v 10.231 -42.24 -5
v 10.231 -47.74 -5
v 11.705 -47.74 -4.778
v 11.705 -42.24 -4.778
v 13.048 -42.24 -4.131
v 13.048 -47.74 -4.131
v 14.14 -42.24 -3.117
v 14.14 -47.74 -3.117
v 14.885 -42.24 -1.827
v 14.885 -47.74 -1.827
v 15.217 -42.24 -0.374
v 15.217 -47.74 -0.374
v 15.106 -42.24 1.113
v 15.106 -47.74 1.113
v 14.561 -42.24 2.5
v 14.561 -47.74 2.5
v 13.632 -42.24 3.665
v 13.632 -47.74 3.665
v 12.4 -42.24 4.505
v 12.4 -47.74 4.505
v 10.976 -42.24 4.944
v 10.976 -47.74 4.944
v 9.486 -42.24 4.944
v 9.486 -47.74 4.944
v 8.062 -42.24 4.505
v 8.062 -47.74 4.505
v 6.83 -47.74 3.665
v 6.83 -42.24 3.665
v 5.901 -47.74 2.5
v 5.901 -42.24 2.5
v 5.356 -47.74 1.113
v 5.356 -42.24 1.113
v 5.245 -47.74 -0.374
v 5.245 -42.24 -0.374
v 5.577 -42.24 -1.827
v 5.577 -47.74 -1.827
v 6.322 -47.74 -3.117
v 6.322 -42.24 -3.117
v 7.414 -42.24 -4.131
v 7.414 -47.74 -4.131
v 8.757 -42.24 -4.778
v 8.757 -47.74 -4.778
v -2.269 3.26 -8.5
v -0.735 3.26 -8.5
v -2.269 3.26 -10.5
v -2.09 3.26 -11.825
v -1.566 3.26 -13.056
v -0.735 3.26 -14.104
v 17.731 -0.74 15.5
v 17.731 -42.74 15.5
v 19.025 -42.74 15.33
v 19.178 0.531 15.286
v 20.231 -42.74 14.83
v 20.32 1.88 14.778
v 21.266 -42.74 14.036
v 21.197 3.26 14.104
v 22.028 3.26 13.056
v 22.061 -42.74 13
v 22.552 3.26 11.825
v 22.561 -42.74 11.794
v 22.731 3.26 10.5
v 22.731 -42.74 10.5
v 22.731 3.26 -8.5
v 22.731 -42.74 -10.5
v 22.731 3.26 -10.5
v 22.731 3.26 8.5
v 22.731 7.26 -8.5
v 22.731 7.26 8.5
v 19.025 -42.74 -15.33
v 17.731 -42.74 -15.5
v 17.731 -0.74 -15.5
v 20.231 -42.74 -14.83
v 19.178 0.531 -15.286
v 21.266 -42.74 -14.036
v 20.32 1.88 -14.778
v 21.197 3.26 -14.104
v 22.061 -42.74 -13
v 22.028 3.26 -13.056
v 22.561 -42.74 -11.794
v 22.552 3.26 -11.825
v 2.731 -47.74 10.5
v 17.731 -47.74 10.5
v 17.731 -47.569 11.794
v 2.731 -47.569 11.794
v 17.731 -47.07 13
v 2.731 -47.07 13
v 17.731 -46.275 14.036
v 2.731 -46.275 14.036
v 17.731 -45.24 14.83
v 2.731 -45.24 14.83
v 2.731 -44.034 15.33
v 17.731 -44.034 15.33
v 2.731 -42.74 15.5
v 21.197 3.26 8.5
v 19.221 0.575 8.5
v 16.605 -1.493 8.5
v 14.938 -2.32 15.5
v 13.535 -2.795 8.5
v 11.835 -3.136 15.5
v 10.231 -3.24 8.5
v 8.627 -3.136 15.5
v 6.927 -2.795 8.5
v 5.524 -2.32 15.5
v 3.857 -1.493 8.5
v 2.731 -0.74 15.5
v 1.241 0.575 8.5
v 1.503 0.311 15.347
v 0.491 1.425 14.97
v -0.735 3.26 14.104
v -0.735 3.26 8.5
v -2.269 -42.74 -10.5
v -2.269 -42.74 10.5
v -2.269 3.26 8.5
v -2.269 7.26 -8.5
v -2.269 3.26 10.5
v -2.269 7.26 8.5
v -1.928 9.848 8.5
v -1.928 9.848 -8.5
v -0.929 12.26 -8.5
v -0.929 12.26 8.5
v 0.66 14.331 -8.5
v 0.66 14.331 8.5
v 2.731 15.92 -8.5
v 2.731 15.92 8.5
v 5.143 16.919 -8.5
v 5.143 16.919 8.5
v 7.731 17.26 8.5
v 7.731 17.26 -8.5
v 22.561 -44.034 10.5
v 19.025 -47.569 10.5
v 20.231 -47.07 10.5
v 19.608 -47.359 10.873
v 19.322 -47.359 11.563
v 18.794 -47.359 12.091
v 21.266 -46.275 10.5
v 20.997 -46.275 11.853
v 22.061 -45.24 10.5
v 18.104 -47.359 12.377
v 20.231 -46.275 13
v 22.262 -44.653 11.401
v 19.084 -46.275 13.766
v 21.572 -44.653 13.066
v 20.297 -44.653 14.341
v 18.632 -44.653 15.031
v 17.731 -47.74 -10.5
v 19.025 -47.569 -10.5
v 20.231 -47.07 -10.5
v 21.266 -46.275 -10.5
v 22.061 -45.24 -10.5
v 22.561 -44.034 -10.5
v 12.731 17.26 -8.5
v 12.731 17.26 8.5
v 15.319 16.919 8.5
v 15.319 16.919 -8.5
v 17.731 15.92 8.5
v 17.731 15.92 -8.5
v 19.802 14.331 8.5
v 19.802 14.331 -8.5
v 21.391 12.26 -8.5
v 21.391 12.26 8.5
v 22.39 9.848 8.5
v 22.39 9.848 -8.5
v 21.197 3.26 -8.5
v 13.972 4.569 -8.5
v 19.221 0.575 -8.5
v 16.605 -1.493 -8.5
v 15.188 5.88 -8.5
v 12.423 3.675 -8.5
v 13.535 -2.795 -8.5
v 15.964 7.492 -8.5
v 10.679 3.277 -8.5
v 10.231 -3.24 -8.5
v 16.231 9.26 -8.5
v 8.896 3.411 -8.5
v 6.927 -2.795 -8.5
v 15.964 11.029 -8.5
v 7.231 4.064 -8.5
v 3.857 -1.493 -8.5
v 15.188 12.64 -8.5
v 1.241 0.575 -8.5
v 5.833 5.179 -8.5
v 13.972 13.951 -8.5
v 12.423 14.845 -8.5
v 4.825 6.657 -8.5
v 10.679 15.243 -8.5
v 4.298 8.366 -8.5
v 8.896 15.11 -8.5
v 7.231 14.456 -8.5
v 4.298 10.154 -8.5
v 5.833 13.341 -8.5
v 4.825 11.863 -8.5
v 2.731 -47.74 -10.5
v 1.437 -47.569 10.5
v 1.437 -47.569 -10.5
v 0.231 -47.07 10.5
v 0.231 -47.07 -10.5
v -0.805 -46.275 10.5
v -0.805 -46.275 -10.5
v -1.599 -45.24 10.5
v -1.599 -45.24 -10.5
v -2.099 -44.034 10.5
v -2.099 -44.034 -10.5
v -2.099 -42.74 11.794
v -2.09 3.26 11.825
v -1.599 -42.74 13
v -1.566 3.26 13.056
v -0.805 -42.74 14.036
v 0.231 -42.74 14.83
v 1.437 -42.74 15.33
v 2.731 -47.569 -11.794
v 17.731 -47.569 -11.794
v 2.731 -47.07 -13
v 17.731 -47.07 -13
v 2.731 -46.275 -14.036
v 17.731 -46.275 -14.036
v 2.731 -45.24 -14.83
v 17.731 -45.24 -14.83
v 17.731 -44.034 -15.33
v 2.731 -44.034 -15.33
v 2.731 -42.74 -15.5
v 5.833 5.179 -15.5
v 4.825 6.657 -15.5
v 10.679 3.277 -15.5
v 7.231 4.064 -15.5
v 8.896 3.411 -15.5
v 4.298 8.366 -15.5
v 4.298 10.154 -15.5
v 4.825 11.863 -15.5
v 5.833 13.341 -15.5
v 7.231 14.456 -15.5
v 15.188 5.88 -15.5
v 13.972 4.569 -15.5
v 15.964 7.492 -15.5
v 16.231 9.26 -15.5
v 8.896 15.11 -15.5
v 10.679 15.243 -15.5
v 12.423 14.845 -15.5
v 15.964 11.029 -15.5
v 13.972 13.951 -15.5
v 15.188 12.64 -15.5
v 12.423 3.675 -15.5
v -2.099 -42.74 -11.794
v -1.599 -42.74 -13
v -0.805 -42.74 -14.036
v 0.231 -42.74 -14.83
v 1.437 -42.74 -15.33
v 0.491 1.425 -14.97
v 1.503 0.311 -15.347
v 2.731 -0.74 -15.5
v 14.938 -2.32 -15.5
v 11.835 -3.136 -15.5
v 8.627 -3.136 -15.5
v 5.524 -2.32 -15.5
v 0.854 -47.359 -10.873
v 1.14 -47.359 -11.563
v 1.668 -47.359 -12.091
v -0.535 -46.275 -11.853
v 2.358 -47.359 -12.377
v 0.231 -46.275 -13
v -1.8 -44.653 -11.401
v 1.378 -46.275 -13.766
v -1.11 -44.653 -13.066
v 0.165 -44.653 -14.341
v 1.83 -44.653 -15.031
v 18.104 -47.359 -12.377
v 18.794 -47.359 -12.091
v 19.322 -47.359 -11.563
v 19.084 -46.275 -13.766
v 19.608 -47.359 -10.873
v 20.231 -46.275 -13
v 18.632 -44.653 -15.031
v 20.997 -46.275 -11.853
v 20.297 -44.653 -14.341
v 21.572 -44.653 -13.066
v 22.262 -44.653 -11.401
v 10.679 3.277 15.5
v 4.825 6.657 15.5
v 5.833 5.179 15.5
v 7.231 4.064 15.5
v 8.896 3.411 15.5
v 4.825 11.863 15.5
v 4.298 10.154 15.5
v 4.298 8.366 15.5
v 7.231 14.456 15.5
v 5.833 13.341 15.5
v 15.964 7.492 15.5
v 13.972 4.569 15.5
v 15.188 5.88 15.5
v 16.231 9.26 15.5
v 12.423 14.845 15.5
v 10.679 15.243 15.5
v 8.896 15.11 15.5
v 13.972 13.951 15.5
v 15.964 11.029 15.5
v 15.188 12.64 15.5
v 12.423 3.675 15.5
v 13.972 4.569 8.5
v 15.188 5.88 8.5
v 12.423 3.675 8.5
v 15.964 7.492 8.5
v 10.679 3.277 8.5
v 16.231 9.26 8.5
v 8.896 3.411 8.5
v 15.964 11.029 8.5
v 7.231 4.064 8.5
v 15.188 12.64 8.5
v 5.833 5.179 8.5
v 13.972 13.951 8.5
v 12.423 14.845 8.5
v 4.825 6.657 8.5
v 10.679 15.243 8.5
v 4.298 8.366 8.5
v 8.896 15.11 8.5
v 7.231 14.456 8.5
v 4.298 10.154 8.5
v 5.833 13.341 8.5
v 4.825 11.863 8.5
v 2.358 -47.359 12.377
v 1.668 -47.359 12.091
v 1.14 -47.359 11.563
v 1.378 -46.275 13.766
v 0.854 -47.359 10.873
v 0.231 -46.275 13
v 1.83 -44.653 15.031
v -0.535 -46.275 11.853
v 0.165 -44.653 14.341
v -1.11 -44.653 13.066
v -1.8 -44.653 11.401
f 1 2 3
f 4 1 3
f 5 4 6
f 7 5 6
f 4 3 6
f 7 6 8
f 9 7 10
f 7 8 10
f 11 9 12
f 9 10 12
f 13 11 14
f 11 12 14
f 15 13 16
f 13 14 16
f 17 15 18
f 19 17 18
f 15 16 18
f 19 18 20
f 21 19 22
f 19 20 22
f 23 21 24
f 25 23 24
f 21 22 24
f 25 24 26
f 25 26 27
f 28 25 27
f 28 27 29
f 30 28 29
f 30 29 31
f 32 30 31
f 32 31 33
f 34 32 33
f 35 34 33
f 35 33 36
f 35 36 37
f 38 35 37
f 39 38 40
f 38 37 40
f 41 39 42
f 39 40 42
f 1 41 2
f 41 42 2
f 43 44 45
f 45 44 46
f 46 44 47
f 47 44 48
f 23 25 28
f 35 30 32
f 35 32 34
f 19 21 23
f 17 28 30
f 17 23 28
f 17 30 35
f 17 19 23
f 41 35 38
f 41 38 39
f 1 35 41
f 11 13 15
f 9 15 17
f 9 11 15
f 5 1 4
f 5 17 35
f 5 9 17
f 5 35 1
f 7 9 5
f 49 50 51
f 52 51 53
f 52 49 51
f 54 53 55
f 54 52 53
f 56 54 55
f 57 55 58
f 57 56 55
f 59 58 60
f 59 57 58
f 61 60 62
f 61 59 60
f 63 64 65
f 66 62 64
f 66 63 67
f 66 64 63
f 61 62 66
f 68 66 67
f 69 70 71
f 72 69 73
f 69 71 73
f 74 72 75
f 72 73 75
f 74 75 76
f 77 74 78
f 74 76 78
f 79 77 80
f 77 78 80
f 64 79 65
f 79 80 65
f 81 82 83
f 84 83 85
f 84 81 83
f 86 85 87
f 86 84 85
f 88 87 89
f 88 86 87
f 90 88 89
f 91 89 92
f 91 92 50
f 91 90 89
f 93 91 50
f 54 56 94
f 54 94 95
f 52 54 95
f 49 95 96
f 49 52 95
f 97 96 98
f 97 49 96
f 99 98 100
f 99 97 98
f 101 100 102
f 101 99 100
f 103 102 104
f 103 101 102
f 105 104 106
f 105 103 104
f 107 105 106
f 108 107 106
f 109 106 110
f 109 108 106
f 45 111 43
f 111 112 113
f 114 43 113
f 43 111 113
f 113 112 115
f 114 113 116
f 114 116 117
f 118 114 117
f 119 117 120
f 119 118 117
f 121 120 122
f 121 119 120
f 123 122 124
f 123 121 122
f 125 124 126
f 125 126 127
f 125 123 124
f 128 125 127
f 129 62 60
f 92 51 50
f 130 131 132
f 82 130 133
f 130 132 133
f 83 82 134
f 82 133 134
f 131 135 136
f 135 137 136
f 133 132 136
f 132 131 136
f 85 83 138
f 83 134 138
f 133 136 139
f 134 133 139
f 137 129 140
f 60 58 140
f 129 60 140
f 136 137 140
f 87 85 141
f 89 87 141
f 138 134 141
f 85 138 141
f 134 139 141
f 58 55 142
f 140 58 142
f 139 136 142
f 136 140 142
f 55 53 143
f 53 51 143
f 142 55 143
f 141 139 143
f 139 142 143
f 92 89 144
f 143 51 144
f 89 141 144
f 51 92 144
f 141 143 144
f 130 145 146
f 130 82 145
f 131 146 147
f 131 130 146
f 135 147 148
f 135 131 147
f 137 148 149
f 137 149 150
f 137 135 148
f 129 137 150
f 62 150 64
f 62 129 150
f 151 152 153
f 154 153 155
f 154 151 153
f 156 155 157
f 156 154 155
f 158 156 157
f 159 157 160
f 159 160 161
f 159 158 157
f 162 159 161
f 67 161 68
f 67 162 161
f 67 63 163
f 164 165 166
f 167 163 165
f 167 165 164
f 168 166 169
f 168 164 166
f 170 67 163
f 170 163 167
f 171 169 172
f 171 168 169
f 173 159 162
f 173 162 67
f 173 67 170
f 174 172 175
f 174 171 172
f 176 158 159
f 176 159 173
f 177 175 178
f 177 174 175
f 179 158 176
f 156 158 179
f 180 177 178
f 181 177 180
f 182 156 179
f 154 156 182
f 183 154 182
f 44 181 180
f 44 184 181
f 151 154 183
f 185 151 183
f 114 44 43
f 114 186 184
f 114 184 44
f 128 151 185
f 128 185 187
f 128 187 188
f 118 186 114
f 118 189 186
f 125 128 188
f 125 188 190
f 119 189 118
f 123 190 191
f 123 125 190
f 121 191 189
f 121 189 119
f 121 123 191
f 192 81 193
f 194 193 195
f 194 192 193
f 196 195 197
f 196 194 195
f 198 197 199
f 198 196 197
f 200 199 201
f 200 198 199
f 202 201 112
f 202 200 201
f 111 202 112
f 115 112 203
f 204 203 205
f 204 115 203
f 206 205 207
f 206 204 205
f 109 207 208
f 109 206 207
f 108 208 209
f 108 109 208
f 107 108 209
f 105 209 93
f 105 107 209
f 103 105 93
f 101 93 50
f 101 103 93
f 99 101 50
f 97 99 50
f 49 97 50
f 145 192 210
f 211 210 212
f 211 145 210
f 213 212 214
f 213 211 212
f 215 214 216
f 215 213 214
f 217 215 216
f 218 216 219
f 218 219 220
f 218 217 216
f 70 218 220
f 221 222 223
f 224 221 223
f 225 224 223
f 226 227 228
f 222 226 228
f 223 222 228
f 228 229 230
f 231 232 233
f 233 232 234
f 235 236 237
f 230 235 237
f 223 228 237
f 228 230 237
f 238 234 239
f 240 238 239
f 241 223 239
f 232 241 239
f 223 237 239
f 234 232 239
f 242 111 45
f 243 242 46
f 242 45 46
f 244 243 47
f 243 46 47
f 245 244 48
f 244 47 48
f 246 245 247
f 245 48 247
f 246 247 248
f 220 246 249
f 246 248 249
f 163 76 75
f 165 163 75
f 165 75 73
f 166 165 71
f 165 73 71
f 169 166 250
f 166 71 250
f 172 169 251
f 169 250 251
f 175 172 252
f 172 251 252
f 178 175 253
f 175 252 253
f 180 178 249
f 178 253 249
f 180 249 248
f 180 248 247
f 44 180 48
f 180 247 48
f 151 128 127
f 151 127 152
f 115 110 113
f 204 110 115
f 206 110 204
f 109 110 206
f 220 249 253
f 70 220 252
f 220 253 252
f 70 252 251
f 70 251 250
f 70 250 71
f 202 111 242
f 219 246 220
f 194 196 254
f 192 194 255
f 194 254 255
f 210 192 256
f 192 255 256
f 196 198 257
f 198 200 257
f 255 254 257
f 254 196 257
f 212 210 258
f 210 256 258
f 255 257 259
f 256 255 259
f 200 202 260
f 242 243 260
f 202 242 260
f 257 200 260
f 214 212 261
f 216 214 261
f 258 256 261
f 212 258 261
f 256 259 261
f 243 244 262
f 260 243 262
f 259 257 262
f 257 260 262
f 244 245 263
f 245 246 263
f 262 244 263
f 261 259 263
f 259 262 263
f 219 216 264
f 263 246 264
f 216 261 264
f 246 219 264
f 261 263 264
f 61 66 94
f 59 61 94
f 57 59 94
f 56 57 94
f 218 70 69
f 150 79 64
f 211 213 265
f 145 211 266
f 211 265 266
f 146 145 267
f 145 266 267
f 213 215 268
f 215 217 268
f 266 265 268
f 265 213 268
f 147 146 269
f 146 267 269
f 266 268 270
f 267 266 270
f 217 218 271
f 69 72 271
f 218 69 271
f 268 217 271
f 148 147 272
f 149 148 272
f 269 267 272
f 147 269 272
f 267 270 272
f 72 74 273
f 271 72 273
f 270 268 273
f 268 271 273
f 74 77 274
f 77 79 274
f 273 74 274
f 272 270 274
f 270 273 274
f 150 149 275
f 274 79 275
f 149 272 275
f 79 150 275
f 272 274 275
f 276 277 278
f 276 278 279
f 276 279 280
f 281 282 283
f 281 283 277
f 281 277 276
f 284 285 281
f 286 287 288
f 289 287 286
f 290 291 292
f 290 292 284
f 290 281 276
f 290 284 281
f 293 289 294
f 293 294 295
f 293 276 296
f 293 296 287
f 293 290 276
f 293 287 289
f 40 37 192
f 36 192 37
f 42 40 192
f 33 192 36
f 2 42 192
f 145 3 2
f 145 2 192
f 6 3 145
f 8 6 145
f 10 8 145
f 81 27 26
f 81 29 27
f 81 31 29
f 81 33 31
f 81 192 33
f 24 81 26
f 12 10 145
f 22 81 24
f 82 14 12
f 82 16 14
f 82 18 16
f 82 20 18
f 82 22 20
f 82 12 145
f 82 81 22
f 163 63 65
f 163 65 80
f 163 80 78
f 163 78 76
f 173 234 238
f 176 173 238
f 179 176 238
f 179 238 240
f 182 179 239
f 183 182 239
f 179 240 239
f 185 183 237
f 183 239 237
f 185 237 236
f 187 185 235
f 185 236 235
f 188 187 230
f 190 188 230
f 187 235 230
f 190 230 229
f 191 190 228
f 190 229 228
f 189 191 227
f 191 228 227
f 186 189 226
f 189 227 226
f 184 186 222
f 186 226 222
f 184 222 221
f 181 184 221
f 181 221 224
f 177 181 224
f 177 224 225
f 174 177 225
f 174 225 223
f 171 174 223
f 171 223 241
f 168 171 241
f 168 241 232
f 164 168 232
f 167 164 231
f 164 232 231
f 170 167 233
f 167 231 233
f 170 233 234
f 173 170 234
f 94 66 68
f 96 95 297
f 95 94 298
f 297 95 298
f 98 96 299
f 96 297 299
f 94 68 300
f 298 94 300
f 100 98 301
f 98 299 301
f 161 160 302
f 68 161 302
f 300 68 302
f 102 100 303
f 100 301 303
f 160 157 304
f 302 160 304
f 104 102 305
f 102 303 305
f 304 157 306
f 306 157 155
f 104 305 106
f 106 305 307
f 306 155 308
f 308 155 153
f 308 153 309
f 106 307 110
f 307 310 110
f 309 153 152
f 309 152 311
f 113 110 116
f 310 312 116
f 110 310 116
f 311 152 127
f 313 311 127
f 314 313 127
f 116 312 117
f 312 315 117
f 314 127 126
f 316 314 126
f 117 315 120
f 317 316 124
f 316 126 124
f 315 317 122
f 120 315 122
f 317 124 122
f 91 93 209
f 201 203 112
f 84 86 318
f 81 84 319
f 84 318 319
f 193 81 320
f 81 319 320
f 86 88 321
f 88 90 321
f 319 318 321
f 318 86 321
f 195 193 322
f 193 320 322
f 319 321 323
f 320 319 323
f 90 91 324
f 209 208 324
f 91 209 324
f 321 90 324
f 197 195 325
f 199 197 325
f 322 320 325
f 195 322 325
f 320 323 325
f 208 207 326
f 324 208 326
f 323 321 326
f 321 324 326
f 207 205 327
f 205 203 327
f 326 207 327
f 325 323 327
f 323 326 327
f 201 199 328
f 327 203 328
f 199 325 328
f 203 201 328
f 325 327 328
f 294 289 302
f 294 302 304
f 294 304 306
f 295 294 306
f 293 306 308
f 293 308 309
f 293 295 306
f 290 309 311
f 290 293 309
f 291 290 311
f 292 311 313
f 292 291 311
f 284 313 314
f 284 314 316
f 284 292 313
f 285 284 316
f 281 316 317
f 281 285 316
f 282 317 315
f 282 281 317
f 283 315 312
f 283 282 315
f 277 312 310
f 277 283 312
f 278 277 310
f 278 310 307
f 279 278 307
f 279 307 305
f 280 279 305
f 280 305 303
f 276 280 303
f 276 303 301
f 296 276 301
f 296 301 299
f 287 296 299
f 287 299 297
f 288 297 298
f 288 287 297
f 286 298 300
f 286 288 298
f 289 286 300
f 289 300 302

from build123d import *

# Parameters (mm, degrees)
CROQUIS1_W              = 25
CROQUIS1_H              = 65
SALIENTE_EXTRUIR1_DEPTH = 15.5
CROQUIS2_R              = 6
CORTAR_EXTRUIR1_DEPTH   = 7
REDONDEO1_R             = 10
REDONDEO2_R             = 5
CROQUIS3_R              = 5
CORTAR_EXTRUIR2_DEPTH   = 5.5
REDONDEO3_R             = 5


with BuildPart() as part:
    # Croquis1 → Saliente-Extruir1 (new, symmetric)
    with BuildSketch(Plane.XY):
        with Locations((10.230951989, -15.239848308)):
            Rectangle(CROQUIS1_W, CROQUIS1_H)
    extrude(amount=SALIENTE_EXTRUIR1_DEPTH, both=True)

    # Croquis2 → Cortar-Extruir1 (cut)
    with BuildSketch(Plane.XY.offset(15.5)):
        with BuildLine():
            Line((-2.269048011, 9.260151692), (-2.269048011, 26.058320898))
            Line((-2.269048011, 26.058320898), (22.730951989, 26.058320898))
            Line((22.730951989, 26.058320898), (22.730951989, 9.260151692))
            Line((22.730951989, 9.260151692), (22.730951989, 3.260151692))
            Line((22.730951989, 3.260151692), (21.196808088, 3.260151692))
            ThreePointArc((21.196808088, 3.260151692), (10.230951989, -3.239848308), (-0.734904111, 3.260151692))
            Line((-0.734904111, 3.260151692), (-2.269048011, 3.260151692))
            Line((-2.269048011, 3.260151692), (-2.269048011, 9.260151692))
        make_face()
        with Locations((10.230951989, 9.260151692)):
            Circle(CROQUIS2_R, mode=Mode.SUBTRACT)
    cortar_extruir1 = extrude(amount=-CORTAR_EXTRUIR1_DEPTH, mode=Mode.SUBTRACT)

    # Simetría1: Cortar-Extruir1 across plane
    add(cortar_extruir1.mirror(Plane.XY), mode=Mode.SUBTRACT)

    # Redondeo1
    redondeo1_edges = [part.edges().sort_by_distance(p)[0] for p in [
        (-2.269048011, 17.260151692, 0),
        (22.730951989, 17.260151692, 0),
    ]]
    fillet(redondeo1_edges, radius=REDONDEO1_R)

    # Redondeo2
    redondeo2_edges = [part.edges().sort_by_distance(p)[0] for p in [
        (22.730951989, -22.239848308, -15.5),
        (22.730951989, -22.239848308, 15.5),
        (-2.269048011, -22.239848308, 15.5),
        (-2.269048011, -22.239848308, -15.5),
    ]]
    fillet(redondeo2_edges, radius=REDONDEO2_R)

    # Croquis3 → Cortar-Extruir2 (cut)
    with BuildSketch(Plane.XZ.offset(47.739848308)):
        with Locations(Location((10.230951989, 0, 0), (0, 0, 270))):
            Circle(CROQUIS3_R)
    extrude(amount=-CORTAR_EXTRUIR2_DEPTH, mode=Mode.SUBTRACT)

    # Redondeo3
    redondeo3_edges = [part.edges().sort_by_distance(p)[0] for p in [
        (22.730951989, -47.739848308, 0),
        (10.230951989, -47.739848308, -15.5),
        (10.230951989, -47.739848308, 15.5),
        (-2.269048011, -47.739848308, 0),
        (-0.804581917, -47.739848308, -14.035533906),
        (-0.804581917, -47.739848308, 14.035533906),
        (21.266485895, -47.739848308, 14.035533906),
        (21.266485895, -47.739848308, -14.035533906),
    ]]
    fillet(redondeo3_edges, radius=REDONDEO3_R)


solid = part.part
